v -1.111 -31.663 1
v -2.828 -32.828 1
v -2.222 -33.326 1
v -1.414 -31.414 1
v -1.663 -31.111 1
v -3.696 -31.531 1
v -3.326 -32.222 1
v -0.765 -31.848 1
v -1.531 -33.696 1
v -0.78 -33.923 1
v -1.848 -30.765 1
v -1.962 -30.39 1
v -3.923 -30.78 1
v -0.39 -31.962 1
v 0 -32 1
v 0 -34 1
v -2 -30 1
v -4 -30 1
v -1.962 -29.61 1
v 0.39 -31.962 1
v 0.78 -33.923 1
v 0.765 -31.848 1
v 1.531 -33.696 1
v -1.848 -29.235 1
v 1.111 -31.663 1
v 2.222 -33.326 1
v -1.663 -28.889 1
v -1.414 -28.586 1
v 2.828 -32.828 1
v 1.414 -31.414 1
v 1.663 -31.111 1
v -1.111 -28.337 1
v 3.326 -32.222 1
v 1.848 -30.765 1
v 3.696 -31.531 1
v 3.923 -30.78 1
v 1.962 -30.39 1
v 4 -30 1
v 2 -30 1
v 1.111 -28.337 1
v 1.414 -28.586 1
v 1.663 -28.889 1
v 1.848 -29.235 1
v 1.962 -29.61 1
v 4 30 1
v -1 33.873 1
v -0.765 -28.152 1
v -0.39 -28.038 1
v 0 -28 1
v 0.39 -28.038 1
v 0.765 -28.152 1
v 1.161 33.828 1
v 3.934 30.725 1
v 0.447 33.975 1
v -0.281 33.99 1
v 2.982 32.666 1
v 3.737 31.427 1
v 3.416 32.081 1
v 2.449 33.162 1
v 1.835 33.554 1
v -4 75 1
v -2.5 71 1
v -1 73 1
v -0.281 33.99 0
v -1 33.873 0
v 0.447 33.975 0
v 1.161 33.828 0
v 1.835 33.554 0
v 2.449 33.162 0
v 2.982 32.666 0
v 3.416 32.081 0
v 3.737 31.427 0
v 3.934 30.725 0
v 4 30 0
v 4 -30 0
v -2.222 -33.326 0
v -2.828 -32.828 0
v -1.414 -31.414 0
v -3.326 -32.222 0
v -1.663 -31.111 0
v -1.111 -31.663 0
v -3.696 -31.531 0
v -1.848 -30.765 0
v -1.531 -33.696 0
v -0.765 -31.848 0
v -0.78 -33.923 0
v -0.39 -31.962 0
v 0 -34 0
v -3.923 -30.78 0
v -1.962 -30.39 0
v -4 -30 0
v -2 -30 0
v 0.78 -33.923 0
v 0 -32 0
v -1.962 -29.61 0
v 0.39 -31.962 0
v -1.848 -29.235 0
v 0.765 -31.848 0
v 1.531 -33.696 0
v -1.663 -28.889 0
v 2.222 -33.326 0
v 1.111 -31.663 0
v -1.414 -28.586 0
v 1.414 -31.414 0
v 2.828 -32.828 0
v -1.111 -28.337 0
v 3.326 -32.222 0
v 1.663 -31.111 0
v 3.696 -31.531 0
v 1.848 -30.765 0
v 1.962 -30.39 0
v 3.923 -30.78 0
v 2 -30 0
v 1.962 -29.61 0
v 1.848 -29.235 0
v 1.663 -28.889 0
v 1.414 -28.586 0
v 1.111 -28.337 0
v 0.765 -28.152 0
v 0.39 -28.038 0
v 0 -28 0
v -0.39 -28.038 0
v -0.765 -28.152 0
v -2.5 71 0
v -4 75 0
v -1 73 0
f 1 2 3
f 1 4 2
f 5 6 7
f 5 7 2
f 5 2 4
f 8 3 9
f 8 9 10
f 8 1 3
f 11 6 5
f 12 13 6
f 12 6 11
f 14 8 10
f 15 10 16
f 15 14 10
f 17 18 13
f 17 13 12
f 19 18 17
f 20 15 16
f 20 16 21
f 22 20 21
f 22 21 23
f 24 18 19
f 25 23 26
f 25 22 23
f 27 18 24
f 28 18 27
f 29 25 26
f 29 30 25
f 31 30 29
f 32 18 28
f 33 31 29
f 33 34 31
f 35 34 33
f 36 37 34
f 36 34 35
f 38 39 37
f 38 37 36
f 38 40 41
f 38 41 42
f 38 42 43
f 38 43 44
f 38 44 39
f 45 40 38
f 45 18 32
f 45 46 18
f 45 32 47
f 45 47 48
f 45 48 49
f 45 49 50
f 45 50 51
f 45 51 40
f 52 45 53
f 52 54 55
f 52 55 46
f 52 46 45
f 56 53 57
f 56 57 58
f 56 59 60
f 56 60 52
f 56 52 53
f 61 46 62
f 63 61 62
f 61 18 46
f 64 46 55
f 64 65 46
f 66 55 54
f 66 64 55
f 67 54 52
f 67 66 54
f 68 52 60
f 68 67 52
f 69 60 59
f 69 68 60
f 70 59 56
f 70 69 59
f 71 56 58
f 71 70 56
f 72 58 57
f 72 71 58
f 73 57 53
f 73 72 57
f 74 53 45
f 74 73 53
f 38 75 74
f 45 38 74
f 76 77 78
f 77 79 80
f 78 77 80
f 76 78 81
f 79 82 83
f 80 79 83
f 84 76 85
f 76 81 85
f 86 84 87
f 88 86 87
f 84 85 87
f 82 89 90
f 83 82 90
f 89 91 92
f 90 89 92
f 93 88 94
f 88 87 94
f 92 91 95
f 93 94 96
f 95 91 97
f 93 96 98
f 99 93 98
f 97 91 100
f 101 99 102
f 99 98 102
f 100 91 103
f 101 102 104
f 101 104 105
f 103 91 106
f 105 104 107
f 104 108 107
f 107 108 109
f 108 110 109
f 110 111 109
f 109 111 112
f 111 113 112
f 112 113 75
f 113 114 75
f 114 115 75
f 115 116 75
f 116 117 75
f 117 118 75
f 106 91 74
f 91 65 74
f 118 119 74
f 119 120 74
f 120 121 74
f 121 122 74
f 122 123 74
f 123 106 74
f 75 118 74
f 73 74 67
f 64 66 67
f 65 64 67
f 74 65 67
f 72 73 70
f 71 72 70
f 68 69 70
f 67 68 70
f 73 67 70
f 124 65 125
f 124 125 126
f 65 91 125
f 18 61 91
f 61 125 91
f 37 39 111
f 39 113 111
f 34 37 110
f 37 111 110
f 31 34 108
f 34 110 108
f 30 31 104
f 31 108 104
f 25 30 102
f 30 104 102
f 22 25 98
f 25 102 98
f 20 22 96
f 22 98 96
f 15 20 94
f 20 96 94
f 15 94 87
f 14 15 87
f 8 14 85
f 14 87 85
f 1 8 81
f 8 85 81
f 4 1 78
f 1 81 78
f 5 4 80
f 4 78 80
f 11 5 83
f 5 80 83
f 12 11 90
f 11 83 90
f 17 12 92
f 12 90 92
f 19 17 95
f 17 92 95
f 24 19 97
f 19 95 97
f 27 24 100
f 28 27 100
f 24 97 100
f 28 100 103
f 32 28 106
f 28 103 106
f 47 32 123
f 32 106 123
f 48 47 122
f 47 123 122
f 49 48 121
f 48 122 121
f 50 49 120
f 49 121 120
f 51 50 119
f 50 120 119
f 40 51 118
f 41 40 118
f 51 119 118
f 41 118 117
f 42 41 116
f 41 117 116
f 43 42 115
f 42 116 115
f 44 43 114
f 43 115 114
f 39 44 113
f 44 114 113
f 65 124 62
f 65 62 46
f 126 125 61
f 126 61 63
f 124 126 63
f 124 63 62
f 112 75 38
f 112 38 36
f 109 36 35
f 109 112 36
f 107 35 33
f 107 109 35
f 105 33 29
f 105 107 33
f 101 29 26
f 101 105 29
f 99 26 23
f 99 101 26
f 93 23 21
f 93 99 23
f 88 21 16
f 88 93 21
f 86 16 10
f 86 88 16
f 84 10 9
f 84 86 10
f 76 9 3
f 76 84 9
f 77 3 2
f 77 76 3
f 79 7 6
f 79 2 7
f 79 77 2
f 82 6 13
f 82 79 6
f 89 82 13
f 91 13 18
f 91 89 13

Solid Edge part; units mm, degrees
sketch "Sketch1" plane through (0, 0, 0) normal (0, 0, 1) x (1, 0, 0)
  line L0 (4, -30) -> (4, 30)
  arc A0 (4, 30) -> (-1, 33.873) centre (0, 30) ccw
  line L1 (-2.5, 71) -> (-1, 33.873)
  line L2 (-1, 73) -> (-2.5, 71)
  line L3 (-4, 75) -> (-1, 73)
  line L4 (-4, 30) -> (-4, 75)
  line L5 (-4, 30) -> (-4, -30)
  arc A1 (-4, -30) -> (4, -30) centre (0, -30) ccw
  dimension "D1" = 4
  dimension "D2" = 2.5
extrude "Ajout_matière_1" add sketch "Sketch1" along normal blind 1
sketch "Sketch2" plane through (0, 0, 0) normal (0, 0, 1) x (1, 0, 0)
  circle A0 centre (0, -30) radius 2
  dimension "D1" = 4
extrude "Cutout1" cut sketch "Sketch2" along normal up to next
properties material "Acier S235"
